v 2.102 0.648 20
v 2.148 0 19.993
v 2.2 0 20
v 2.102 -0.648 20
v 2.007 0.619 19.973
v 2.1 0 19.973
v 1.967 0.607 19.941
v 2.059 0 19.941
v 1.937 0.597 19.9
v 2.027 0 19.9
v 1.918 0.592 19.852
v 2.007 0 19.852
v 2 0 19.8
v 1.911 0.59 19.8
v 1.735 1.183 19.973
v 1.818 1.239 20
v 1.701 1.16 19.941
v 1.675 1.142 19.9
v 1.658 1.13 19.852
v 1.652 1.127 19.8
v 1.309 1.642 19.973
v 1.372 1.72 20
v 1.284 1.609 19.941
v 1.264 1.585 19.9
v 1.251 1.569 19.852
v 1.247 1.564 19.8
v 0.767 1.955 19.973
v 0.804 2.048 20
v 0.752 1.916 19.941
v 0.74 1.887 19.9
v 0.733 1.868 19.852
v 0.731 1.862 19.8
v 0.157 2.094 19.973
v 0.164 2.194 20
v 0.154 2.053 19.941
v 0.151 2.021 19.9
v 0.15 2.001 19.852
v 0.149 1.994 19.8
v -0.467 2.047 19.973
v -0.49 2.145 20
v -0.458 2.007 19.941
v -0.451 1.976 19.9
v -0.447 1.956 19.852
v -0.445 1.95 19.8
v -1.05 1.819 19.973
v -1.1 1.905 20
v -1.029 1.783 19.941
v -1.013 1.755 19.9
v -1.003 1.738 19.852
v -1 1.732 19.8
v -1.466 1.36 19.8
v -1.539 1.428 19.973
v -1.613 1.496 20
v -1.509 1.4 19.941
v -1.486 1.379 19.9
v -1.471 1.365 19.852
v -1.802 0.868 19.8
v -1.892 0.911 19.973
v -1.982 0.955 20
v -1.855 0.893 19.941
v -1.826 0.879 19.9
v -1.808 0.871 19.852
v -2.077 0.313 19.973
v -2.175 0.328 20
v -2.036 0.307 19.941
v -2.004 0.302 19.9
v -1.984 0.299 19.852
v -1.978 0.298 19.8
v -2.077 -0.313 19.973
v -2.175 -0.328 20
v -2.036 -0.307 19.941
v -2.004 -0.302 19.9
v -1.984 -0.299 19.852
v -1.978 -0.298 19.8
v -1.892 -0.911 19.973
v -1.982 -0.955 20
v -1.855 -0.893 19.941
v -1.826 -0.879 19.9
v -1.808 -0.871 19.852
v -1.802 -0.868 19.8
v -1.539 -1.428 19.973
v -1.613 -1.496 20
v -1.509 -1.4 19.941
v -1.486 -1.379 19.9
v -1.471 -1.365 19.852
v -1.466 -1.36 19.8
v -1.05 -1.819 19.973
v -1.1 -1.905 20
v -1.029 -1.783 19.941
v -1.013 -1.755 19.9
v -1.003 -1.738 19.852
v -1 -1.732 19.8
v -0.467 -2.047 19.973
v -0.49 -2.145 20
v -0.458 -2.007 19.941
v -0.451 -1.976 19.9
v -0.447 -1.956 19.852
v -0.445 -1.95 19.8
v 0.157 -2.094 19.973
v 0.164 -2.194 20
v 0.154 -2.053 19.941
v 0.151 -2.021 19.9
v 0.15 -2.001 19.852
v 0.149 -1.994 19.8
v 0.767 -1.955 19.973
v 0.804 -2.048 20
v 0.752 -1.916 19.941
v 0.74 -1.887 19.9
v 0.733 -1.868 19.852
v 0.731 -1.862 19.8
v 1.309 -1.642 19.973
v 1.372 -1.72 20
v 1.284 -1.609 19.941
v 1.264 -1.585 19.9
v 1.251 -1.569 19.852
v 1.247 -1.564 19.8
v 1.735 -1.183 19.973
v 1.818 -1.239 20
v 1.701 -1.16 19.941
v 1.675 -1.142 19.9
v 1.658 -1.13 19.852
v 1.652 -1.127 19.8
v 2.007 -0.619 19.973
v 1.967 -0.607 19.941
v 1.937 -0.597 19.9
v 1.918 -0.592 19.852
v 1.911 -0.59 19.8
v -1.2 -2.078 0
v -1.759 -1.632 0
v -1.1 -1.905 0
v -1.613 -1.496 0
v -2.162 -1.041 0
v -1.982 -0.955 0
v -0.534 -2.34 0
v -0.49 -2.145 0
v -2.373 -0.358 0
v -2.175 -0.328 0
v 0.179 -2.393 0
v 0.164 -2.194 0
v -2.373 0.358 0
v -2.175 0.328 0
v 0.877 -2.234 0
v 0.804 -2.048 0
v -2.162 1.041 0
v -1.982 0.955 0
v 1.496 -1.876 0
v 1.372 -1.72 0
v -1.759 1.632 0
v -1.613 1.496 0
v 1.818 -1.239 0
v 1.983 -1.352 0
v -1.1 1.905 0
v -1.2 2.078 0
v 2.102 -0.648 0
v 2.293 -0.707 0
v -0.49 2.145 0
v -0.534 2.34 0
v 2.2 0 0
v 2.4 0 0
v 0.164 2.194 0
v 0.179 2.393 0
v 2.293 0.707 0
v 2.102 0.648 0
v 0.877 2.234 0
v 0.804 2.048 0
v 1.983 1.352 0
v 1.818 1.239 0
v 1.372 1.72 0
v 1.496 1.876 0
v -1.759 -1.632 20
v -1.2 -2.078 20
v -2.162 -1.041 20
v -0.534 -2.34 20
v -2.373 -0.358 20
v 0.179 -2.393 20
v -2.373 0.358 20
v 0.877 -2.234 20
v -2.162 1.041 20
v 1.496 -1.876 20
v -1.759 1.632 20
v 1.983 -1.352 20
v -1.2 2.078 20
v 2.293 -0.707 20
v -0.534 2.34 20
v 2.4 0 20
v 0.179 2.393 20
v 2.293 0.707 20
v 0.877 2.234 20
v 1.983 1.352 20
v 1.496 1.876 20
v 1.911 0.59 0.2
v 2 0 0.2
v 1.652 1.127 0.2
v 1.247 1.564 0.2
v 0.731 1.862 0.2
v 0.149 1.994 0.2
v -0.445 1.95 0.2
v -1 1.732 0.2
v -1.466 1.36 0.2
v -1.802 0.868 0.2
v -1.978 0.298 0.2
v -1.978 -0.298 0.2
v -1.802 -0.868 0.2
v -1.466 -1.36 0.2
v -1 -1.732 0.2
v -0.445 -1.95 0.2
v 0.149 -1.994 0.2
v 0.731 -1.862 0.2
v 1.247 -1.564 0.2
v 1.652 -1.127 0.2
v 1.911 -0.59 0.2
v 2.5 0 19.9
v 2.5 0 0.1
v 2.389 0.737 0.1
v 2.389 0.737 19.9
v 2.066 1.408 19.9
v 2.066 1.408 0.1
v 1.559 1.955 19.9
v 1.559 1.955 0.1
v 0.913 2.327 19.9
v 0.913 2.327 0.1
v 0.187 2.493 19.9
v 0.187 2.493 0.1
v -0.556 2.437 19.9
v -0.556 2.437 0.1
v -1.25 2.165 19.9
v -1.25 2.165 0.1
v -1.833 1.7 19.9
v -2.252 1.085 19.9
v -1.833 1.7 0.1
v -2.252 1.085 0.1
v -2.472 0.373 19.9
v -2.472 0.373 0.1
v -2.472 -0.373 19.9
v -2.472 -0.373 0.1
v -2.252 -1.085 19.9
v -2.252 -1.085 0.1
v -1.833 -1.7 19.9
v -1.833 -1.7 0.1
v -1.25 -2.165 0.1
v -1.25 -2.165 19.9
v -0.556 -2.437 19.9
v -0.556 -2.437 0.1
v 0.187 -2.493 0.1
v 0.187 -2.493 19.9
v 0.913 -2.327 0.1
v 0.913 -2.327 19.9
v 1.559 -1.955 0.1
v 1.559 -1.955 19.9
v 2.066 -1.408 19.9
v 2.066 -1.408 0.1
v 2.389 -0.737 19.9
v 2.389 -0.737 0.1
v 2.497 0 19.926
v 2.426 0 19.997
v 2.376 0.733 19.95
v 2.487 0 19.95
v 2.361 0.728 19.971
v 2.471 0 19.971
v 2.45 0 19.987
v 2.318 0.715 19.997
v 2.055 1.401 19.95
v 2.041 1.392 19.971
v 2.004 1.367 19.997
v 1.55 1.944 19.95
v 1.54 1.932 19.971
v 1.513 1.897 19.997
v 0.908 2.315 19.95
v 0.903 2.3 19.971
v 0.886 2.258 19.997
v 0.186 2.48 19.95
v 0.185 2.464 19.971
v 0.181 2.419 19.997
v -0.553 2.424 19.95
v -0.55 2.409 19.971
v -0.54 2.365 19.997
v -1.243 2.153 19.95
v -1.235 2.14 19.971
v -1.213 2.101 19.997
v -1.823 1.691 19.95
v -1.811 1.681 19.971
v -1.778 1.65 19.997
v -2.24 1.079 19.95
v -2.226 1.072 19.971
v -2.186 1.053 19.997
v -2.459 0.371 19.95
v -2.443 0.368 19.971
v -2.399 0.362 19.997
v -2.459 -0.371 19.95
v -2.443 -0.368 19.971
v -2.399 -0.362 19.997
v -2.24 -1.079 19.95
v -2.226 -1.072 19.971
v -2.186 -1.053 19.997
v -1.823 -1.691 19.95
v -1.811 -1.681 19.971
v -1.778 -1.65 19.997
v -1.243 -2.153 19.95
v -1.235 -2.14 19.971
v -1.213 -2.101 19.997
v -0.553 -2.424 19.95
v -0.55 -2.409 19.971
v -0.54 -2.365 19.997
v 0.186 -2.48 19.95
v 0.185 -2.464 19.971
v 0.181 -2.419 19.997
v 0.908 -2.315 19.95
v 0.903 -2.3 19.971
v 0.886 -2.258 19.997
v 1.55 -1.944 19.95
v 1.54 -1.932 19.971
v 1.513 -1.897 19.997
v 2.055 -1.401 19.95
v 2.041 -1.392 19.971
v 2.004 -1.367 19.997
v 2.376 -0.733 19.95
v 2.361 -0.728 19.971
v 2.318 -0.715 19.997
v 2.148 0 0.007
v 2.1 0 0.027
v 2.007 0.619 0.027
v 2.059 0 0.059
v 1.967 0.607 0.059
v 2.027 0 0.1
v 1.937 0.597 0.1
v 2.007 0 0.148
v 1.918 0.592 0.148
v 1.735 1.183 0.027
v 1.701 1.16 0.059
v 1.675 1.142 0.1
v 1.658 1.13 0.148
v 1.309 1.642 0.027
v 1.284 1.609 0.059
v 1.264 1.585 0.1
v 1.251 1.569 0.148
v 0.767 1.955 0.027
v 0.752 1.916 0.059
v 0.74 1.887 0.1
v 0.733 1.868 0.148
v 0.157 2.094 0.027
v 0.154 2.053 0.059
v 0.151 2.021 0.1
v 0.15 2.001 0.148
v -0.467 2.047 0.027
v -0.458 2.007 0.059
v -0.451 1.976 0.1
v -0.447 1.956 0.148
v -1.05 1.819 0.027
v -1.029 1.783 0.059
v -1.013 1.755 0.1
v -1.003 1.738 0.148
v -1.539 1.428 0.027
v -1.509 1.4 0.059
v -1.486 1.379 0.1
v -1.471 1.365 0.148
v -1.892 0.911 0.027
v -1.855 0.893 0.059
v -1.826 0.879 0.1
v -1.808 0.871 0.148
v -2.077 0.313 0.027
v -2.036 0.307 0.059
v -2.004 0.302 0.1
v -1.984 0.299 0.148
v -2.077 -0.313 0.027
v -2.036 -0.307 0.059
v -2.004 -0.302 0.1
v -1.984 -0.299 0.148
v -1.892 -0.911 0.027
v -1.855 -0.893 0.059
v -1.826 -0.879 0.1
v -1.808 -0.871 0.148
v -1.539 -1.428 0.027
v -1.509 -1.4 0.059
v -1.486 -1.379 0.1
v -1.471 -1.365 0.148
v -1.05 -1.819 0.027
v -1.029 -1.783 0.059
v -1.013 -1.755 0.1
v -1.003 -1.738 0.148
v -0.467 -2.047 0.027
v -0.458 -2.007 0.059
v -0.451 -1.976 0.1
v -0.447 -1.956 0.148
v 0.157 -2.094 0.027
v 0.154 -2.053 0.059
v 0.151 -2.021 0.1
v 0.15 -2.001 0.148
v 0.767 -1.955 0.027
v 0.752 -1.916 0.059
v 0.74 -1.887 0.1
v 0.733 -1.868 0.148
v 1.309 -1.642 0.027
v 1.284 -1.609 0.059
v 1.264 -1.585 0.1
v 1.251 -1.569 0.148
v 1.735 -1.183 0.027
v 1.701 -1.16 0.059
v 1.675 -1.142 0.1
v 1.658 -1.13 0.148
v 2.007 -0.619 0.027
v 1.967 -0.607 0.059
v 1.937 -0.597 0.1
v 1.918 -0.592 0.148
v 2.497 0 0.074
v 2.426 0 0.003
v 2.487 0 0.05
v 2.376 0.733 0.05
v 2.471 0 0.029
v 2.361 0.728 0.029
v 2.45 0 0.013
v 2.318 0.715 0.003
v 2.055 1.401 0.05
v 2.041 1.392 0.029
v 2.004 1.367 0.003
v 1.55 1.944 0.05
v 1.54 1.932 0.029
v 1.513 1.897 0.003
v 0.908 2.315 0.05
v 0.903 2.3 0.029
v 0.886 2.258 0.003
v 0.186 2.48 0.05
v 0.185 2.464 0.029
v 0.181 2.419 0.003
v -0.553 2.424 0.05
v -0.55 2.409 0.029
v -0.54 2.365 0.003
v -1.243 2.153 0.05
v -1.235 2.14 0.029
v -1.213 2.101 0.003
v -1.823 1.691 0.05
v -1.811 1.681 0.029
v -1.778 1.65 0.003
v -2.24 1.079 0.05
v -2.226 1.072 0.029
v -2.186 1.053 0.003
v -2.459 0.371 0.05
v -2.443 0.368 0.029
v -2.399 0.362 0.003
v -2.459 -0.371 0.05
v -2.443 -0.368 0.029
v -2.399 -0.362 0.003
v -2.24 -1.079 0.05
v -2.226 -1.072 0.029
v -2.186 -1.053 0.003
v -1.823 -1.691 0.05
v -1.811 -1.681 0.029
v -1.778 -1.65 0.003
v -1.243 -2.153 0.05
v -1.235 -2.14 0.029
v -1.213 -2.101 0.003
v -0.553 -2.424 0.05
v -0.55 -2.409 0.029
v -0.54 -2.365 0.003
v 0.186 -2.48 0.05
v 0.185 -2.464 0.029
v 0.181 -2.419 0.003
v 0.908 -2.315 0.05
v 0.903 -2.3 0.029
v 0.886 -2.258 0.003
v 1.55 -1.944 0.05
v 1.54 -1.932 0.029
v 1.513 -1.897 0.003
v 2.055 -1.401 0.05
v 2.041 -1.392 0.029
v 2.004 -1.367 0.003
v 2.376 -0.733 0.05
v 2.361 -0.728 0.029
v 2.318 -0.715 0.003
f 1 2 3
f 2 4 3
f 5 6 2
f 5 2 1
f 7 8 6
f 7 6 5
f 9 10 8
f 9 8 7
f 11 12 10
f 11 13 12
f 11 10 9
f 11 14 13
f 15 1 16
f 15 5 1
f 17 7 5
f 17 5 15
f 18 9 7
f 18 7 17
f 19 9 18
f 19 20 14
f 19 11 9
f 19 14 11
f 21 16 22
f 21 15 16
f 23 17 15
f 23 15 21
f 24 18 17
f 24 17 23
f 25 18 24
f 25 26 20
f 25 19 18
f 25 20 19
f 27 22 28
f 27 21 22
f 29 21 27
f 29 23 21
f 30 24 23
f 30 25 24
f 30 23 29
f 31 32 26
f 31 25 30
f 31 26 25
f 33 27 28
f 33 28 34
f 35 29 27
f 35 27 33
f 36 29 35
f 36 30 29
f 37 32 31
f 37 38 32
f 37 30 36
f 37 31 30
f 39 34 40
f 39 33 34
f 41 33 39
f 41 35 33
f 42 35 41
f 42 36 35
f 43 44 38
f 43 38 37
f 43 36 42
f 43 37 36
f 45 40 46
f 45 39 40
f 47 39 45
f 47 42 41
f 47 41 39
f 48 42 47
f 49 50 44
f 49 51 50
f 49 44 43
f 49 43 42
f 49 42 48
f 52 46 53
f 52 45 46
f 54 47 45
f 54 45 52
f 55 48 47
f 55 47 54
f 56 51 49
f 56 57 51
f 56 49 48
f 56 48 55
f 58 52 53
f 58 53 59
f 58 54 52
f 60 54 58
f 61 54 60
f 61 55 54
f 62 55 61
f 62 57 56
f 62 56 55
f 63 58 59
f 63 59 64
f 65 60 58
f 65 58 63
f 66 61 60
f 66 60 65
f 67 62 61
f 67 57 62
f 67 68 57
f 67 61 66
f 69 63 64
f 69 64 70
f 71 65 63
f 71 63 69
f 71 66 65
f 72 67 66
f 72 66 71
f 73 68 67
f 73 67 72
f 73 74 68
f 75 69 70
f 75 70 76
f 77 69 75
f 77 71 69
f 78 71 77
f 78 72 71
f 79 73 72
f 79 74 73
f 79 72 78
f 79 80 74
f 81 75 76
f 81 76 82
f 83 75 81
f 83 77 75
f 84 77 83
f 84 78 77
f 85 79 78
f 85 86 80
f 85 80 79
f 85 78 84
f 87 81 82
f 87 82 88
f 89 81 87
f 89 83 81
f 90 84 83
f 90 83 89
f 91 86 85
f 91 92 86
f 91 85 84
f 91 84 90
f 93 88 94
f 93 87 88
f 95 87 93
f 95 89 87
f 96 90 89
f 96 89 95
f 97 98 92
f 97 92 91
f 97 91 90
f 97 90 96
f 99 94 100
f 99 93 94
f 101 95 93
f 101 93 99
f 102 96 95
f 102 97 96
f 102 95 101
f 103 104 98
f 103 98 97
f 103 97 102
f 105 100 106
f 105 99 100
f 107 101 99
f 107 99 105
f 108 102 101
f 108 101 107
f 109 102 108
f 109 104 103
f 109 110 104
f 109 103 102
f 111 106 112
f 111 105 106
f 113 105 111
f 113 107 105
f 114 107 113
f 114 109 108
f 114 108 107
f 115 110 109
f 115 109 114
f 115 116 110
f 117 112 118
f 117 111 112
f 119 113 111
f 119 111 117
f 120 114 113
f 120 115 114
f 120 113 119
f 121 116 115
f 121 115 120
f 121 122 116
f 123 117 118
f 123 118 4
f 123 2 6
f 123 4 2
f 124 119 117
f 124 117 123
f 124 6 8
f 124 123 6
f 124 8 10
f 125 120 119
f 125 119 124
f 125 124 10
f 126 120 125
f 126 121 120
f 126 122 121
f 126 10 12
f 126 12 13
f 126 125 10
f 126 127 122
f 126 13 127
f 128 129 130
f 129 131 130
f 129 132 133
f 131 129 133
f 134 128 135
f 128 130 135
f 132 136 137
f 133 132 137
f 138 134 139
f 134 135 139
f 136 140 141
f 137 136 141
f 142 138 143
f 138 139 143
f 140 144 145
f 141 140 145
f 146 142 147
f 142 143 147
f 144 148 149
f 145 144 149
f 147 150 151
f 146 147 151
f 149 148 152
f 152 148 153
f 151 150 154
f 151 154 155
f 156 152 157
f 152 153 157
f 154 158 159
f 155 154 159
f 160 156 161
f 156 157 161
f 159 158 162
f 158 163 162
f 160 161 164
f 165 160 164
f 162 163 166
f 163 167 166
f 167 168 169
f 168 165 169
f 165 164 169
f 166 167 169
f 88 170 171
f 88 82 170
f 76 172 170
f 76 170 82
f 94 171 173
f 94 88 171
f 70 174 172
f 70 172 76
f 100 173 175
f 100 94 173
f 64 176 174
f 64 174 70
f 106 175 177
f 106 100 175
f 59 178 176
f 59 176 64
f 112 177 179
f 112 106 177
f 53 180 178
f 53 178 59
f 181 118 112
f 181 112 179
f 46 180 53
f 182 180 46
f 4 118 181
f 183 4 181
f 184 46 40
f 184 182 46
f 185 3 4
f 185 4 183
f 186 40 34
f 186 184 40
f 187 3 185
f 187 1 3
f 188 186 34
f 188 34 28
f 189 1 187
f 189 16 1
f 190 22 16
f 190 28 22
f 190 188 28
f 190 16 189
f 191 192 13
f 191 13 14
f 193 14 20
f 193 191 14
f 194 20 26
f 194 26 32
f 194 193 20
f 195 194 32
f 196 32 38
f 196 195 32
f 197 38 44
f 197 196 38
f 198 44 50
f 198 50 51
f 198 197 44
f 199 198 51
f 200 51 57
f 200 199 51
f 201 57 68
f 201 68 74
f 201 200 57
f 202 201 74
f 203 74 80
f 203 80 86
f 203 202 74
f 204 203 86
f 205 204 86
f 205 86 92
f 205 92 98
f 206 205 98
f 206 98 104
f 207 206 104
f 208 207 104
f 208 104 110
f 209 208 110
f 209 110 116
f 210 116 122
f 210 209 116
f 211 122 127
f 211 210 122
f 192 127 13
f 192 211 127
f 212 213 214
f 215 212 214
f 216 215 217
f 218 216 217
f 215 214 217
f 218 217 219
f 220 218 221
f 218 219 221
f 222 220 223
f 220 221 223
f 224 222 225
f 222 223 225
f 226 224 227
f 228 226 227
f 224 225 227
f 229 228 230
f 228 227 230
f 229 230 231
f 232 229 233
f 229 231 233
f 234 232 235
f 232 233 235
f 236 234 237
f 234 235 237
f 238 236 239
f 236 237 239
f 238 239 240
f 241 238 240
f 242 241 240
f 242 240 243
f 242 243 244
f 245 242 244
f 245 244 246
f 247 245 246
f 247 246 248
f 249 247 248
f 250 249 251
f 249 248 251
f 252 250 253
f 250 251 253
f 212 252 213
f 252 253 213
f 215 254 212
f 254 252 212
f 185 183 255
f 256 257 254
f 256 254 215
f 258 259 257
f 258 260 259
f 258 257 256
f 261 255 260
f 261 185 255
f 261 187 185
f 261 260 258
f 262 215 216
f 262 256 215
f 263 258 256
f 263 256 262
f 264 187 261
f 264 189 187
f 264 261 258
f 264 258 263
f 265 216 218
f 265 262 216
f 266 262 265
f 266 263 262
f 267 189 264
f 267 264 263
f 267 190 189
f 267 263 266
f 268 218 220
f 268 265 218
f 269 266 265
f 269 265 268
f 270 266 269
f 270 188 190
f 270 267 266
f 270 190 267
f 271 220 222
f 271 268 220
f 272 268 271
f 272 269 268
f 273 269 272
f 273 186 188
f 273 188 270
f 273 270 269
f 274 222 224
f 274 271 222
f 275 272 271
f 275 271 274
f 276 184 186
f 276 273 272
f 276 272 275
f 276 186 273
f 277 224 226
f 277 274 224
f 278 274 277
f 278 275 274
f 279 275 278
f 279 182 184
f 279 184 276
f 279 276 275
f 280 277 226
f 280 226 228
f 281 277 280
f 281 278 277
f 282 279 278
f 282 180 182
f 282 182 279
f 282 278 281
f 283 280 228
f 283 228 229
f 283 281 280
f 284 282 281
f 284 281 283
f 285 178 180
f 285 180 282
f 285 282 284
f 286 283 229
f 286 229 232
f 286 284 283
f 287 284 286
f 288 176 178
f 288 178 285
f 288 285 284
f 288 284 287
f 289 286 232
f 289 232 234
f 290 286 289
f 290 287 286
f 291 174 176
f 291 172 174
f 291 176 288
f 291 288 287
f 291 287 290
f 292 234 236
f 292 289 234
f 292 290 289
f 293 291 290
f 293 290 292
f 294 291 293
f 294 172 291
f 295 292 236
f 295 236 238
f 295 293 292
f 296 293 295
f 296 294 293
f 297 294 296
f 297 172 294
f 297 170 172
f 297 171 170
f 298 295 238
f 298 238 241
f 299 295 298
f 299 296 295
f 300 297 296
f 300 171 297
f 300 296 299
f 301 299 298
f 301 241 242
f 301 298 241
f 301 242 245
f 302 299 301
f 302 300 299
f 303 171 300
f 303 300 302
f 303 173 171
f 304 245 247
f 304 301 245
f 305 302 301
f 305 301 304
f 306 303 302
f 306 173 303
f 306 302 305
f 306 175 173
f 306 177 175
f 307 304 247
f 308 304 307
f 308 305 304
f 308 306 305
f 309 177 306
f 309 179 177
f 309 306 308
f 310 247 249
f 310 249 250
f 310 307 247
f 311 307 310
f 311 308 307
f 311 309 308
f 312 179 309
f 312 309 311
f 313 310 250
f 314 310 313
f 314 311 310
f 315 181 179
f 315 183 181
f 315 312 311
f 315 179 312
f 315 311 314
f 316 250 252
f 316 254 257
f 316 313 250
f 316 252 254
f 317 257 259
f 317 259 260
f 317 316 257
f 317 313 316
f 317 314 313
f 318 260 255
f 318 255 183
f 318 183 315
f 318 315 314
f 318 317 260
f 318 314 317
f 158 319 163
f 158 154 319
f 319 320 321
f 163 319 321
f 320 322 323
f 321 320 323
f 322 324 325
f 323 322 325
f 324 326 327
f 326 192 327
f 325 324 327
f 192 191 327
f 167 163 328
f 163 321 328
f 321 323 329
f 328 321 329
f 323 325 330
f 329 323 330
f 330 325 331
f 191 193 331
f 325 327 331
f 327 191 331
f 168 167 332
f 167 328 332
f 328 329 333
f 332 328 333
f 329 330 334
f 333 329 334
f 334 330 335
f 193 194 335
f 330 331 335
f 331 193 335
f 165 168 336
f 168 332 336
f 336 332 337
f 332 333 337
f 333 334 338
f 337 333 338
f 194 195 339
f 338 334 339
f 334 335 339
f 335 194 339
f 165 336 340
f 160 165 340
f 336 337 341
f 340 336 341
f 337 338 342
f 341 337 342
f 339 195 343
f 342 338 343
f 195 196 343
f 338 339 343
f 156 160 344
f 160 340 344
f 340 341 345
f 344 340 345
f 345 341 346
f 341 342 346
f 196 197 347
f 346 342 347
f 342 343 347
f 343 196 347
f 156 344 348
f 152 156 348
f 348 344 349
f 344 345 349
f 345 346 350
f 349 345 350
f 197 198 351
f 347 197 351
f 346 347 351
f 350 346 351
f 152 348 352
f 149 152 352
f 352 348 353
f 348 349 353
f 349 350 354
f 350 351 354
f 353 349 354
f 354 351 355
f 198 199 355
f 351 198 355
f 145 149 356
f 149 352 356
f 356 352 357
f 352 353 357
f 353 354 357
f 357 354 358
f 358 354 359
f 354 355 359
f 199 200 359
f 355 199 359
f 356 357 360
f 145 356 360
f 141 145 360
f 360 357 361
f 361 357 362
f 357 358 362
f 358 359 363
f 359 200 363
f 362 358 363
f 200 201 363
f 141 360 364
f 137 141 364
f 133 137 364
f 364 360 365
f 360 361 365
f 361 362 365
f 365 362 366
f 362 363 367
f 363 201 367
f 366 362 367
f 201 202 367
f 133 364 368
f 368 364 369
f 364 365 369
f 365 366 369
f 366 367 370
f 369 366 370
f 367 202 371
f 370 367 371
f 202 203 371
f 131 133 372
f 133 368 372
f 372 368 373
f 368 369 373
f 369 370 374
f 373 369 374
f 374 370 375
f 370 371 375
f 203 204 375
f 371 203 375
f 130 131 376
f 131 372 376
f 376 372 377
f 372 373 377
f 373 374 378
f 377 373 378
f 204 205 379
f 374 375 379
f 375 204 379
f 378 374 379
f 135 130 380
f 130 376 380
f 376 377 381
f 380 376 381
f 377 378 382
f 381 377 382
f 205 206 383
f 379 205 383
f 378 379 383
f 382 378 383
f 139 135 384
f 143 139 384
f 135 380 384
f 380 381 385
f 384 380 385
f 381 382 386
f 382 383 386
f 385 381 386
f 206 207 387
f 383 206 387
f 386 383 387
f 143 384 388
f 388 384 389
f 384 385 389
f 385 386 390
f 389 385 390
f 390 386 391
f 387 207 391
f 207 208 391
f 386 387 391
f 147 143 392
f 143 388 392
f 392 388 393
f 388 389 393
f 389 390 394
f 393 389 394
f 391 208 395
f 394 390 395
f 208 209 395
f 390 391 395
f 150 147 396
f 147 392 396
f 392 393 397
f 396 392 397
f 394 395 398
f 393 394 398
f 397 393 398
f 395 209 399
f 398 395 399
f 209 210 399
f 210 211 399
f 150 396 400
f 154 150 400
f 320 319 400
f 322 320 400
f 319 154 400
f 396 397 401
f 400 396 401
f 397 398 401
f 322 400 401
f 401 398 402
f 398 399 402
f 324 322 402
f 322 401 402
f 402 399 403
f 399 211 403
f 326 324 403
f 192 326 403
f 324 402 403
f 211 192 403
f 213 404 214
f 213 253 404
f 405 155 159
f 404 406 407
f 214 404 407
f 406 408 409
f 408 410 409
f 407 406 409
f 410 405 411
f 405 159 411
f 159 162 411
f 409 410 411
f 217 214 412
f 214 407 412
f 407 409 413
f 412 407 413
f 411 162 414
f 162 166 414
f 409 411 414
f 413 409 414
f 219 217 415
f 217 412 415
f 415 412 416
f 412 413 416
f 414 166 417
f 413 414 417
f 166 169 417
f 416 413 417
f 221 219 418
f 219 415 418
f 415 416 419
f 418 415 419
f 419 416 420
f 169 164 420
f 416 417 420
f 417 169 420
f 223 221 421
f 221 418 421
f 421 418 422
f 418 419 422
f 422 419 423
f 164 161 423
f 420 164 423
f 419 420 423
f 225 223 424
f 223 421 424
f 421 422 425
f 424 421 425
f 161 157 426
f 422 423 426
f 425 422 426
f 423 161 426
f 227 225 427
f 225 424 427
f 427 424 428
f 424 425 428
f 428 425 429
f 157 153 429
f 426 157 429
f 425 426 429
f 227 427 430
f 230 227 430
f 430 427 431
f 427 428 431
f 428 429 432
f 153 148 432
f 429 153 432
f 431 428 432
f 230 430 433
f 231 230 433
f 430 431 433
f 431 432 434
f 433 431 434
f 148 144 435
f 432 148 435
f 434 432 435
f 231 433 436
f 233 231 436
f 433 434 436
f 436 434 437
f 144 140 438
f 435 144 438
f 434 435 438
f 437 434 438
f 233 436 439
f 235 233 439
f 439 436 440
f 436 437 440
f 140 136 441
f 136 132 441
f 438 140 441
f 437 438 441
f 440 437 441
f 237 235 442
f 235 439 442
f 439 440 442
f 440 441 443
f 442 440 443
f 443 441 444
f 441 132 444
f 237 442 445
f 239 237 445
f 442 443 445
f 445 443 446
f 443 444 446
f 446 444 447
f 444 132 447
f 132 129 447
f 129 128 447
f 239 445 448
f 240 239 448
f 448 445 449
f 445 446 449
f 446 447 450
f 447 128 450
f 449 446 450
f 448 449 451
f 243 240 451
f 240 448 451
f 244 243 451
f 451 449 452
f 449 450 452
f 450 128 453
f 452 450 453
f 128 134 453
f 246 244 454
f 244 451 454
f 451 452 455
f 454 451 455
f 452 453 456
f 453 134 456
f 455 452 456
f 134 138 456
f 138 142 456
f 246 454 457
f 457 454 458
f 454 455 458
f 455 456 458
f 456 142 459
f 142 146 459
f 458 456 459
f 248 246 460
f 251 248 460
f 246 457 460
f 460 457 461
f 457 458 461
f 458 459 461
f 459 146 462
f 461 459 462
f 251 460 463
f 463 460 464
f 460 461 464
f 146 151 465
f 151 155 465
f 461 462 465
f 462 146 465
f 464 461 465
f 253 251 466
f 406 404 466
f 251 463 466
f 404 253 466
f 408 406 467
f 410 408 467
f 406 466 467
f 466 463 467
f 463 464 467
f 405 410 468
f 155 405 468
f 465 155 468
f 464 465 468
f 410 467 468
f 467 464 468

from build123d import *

# Parameters (mm, degrees)
CROQUIS1_R              = 2.5
CROQUIS1_R_2            = 2
SALIENTE_EXTRUIR2_DEPTH = 20
REDONDEO5_R             = 0.1
REDONDEO6_R             = 0.2


with BuildPart() as part:
    # Croquis1 → Saliente-Extruir2 (new body)
    with BuildSketch(Plane.XY):
        Circle(CROQUIS1_R)
        Circle(CROQUIS1_R_2, mode=Mode.SUBTRACT)
    extrude(amount=SALIENTE_EXTRUIR2_DEPTH)

    # Redondeo5
    redondeo5_edges = [part.edges().sort_by_distance(p)[0] for p in [
        (-2.5, 0, 0),
        (-2.5, 0, 20),
    ]]
    fillet(redondeo5_edges, radius=REDONDEO5_R)

    # Redondeo6
    redondeo6_edges = [part.edges().sort_by_distance(p)[0] for p in [
        (-2, 0, 0),
        (-2, 0, 20),
    ]]
    fillet(redondeo6_edges, radius=REDONDEO6_R)


solid = part.part
